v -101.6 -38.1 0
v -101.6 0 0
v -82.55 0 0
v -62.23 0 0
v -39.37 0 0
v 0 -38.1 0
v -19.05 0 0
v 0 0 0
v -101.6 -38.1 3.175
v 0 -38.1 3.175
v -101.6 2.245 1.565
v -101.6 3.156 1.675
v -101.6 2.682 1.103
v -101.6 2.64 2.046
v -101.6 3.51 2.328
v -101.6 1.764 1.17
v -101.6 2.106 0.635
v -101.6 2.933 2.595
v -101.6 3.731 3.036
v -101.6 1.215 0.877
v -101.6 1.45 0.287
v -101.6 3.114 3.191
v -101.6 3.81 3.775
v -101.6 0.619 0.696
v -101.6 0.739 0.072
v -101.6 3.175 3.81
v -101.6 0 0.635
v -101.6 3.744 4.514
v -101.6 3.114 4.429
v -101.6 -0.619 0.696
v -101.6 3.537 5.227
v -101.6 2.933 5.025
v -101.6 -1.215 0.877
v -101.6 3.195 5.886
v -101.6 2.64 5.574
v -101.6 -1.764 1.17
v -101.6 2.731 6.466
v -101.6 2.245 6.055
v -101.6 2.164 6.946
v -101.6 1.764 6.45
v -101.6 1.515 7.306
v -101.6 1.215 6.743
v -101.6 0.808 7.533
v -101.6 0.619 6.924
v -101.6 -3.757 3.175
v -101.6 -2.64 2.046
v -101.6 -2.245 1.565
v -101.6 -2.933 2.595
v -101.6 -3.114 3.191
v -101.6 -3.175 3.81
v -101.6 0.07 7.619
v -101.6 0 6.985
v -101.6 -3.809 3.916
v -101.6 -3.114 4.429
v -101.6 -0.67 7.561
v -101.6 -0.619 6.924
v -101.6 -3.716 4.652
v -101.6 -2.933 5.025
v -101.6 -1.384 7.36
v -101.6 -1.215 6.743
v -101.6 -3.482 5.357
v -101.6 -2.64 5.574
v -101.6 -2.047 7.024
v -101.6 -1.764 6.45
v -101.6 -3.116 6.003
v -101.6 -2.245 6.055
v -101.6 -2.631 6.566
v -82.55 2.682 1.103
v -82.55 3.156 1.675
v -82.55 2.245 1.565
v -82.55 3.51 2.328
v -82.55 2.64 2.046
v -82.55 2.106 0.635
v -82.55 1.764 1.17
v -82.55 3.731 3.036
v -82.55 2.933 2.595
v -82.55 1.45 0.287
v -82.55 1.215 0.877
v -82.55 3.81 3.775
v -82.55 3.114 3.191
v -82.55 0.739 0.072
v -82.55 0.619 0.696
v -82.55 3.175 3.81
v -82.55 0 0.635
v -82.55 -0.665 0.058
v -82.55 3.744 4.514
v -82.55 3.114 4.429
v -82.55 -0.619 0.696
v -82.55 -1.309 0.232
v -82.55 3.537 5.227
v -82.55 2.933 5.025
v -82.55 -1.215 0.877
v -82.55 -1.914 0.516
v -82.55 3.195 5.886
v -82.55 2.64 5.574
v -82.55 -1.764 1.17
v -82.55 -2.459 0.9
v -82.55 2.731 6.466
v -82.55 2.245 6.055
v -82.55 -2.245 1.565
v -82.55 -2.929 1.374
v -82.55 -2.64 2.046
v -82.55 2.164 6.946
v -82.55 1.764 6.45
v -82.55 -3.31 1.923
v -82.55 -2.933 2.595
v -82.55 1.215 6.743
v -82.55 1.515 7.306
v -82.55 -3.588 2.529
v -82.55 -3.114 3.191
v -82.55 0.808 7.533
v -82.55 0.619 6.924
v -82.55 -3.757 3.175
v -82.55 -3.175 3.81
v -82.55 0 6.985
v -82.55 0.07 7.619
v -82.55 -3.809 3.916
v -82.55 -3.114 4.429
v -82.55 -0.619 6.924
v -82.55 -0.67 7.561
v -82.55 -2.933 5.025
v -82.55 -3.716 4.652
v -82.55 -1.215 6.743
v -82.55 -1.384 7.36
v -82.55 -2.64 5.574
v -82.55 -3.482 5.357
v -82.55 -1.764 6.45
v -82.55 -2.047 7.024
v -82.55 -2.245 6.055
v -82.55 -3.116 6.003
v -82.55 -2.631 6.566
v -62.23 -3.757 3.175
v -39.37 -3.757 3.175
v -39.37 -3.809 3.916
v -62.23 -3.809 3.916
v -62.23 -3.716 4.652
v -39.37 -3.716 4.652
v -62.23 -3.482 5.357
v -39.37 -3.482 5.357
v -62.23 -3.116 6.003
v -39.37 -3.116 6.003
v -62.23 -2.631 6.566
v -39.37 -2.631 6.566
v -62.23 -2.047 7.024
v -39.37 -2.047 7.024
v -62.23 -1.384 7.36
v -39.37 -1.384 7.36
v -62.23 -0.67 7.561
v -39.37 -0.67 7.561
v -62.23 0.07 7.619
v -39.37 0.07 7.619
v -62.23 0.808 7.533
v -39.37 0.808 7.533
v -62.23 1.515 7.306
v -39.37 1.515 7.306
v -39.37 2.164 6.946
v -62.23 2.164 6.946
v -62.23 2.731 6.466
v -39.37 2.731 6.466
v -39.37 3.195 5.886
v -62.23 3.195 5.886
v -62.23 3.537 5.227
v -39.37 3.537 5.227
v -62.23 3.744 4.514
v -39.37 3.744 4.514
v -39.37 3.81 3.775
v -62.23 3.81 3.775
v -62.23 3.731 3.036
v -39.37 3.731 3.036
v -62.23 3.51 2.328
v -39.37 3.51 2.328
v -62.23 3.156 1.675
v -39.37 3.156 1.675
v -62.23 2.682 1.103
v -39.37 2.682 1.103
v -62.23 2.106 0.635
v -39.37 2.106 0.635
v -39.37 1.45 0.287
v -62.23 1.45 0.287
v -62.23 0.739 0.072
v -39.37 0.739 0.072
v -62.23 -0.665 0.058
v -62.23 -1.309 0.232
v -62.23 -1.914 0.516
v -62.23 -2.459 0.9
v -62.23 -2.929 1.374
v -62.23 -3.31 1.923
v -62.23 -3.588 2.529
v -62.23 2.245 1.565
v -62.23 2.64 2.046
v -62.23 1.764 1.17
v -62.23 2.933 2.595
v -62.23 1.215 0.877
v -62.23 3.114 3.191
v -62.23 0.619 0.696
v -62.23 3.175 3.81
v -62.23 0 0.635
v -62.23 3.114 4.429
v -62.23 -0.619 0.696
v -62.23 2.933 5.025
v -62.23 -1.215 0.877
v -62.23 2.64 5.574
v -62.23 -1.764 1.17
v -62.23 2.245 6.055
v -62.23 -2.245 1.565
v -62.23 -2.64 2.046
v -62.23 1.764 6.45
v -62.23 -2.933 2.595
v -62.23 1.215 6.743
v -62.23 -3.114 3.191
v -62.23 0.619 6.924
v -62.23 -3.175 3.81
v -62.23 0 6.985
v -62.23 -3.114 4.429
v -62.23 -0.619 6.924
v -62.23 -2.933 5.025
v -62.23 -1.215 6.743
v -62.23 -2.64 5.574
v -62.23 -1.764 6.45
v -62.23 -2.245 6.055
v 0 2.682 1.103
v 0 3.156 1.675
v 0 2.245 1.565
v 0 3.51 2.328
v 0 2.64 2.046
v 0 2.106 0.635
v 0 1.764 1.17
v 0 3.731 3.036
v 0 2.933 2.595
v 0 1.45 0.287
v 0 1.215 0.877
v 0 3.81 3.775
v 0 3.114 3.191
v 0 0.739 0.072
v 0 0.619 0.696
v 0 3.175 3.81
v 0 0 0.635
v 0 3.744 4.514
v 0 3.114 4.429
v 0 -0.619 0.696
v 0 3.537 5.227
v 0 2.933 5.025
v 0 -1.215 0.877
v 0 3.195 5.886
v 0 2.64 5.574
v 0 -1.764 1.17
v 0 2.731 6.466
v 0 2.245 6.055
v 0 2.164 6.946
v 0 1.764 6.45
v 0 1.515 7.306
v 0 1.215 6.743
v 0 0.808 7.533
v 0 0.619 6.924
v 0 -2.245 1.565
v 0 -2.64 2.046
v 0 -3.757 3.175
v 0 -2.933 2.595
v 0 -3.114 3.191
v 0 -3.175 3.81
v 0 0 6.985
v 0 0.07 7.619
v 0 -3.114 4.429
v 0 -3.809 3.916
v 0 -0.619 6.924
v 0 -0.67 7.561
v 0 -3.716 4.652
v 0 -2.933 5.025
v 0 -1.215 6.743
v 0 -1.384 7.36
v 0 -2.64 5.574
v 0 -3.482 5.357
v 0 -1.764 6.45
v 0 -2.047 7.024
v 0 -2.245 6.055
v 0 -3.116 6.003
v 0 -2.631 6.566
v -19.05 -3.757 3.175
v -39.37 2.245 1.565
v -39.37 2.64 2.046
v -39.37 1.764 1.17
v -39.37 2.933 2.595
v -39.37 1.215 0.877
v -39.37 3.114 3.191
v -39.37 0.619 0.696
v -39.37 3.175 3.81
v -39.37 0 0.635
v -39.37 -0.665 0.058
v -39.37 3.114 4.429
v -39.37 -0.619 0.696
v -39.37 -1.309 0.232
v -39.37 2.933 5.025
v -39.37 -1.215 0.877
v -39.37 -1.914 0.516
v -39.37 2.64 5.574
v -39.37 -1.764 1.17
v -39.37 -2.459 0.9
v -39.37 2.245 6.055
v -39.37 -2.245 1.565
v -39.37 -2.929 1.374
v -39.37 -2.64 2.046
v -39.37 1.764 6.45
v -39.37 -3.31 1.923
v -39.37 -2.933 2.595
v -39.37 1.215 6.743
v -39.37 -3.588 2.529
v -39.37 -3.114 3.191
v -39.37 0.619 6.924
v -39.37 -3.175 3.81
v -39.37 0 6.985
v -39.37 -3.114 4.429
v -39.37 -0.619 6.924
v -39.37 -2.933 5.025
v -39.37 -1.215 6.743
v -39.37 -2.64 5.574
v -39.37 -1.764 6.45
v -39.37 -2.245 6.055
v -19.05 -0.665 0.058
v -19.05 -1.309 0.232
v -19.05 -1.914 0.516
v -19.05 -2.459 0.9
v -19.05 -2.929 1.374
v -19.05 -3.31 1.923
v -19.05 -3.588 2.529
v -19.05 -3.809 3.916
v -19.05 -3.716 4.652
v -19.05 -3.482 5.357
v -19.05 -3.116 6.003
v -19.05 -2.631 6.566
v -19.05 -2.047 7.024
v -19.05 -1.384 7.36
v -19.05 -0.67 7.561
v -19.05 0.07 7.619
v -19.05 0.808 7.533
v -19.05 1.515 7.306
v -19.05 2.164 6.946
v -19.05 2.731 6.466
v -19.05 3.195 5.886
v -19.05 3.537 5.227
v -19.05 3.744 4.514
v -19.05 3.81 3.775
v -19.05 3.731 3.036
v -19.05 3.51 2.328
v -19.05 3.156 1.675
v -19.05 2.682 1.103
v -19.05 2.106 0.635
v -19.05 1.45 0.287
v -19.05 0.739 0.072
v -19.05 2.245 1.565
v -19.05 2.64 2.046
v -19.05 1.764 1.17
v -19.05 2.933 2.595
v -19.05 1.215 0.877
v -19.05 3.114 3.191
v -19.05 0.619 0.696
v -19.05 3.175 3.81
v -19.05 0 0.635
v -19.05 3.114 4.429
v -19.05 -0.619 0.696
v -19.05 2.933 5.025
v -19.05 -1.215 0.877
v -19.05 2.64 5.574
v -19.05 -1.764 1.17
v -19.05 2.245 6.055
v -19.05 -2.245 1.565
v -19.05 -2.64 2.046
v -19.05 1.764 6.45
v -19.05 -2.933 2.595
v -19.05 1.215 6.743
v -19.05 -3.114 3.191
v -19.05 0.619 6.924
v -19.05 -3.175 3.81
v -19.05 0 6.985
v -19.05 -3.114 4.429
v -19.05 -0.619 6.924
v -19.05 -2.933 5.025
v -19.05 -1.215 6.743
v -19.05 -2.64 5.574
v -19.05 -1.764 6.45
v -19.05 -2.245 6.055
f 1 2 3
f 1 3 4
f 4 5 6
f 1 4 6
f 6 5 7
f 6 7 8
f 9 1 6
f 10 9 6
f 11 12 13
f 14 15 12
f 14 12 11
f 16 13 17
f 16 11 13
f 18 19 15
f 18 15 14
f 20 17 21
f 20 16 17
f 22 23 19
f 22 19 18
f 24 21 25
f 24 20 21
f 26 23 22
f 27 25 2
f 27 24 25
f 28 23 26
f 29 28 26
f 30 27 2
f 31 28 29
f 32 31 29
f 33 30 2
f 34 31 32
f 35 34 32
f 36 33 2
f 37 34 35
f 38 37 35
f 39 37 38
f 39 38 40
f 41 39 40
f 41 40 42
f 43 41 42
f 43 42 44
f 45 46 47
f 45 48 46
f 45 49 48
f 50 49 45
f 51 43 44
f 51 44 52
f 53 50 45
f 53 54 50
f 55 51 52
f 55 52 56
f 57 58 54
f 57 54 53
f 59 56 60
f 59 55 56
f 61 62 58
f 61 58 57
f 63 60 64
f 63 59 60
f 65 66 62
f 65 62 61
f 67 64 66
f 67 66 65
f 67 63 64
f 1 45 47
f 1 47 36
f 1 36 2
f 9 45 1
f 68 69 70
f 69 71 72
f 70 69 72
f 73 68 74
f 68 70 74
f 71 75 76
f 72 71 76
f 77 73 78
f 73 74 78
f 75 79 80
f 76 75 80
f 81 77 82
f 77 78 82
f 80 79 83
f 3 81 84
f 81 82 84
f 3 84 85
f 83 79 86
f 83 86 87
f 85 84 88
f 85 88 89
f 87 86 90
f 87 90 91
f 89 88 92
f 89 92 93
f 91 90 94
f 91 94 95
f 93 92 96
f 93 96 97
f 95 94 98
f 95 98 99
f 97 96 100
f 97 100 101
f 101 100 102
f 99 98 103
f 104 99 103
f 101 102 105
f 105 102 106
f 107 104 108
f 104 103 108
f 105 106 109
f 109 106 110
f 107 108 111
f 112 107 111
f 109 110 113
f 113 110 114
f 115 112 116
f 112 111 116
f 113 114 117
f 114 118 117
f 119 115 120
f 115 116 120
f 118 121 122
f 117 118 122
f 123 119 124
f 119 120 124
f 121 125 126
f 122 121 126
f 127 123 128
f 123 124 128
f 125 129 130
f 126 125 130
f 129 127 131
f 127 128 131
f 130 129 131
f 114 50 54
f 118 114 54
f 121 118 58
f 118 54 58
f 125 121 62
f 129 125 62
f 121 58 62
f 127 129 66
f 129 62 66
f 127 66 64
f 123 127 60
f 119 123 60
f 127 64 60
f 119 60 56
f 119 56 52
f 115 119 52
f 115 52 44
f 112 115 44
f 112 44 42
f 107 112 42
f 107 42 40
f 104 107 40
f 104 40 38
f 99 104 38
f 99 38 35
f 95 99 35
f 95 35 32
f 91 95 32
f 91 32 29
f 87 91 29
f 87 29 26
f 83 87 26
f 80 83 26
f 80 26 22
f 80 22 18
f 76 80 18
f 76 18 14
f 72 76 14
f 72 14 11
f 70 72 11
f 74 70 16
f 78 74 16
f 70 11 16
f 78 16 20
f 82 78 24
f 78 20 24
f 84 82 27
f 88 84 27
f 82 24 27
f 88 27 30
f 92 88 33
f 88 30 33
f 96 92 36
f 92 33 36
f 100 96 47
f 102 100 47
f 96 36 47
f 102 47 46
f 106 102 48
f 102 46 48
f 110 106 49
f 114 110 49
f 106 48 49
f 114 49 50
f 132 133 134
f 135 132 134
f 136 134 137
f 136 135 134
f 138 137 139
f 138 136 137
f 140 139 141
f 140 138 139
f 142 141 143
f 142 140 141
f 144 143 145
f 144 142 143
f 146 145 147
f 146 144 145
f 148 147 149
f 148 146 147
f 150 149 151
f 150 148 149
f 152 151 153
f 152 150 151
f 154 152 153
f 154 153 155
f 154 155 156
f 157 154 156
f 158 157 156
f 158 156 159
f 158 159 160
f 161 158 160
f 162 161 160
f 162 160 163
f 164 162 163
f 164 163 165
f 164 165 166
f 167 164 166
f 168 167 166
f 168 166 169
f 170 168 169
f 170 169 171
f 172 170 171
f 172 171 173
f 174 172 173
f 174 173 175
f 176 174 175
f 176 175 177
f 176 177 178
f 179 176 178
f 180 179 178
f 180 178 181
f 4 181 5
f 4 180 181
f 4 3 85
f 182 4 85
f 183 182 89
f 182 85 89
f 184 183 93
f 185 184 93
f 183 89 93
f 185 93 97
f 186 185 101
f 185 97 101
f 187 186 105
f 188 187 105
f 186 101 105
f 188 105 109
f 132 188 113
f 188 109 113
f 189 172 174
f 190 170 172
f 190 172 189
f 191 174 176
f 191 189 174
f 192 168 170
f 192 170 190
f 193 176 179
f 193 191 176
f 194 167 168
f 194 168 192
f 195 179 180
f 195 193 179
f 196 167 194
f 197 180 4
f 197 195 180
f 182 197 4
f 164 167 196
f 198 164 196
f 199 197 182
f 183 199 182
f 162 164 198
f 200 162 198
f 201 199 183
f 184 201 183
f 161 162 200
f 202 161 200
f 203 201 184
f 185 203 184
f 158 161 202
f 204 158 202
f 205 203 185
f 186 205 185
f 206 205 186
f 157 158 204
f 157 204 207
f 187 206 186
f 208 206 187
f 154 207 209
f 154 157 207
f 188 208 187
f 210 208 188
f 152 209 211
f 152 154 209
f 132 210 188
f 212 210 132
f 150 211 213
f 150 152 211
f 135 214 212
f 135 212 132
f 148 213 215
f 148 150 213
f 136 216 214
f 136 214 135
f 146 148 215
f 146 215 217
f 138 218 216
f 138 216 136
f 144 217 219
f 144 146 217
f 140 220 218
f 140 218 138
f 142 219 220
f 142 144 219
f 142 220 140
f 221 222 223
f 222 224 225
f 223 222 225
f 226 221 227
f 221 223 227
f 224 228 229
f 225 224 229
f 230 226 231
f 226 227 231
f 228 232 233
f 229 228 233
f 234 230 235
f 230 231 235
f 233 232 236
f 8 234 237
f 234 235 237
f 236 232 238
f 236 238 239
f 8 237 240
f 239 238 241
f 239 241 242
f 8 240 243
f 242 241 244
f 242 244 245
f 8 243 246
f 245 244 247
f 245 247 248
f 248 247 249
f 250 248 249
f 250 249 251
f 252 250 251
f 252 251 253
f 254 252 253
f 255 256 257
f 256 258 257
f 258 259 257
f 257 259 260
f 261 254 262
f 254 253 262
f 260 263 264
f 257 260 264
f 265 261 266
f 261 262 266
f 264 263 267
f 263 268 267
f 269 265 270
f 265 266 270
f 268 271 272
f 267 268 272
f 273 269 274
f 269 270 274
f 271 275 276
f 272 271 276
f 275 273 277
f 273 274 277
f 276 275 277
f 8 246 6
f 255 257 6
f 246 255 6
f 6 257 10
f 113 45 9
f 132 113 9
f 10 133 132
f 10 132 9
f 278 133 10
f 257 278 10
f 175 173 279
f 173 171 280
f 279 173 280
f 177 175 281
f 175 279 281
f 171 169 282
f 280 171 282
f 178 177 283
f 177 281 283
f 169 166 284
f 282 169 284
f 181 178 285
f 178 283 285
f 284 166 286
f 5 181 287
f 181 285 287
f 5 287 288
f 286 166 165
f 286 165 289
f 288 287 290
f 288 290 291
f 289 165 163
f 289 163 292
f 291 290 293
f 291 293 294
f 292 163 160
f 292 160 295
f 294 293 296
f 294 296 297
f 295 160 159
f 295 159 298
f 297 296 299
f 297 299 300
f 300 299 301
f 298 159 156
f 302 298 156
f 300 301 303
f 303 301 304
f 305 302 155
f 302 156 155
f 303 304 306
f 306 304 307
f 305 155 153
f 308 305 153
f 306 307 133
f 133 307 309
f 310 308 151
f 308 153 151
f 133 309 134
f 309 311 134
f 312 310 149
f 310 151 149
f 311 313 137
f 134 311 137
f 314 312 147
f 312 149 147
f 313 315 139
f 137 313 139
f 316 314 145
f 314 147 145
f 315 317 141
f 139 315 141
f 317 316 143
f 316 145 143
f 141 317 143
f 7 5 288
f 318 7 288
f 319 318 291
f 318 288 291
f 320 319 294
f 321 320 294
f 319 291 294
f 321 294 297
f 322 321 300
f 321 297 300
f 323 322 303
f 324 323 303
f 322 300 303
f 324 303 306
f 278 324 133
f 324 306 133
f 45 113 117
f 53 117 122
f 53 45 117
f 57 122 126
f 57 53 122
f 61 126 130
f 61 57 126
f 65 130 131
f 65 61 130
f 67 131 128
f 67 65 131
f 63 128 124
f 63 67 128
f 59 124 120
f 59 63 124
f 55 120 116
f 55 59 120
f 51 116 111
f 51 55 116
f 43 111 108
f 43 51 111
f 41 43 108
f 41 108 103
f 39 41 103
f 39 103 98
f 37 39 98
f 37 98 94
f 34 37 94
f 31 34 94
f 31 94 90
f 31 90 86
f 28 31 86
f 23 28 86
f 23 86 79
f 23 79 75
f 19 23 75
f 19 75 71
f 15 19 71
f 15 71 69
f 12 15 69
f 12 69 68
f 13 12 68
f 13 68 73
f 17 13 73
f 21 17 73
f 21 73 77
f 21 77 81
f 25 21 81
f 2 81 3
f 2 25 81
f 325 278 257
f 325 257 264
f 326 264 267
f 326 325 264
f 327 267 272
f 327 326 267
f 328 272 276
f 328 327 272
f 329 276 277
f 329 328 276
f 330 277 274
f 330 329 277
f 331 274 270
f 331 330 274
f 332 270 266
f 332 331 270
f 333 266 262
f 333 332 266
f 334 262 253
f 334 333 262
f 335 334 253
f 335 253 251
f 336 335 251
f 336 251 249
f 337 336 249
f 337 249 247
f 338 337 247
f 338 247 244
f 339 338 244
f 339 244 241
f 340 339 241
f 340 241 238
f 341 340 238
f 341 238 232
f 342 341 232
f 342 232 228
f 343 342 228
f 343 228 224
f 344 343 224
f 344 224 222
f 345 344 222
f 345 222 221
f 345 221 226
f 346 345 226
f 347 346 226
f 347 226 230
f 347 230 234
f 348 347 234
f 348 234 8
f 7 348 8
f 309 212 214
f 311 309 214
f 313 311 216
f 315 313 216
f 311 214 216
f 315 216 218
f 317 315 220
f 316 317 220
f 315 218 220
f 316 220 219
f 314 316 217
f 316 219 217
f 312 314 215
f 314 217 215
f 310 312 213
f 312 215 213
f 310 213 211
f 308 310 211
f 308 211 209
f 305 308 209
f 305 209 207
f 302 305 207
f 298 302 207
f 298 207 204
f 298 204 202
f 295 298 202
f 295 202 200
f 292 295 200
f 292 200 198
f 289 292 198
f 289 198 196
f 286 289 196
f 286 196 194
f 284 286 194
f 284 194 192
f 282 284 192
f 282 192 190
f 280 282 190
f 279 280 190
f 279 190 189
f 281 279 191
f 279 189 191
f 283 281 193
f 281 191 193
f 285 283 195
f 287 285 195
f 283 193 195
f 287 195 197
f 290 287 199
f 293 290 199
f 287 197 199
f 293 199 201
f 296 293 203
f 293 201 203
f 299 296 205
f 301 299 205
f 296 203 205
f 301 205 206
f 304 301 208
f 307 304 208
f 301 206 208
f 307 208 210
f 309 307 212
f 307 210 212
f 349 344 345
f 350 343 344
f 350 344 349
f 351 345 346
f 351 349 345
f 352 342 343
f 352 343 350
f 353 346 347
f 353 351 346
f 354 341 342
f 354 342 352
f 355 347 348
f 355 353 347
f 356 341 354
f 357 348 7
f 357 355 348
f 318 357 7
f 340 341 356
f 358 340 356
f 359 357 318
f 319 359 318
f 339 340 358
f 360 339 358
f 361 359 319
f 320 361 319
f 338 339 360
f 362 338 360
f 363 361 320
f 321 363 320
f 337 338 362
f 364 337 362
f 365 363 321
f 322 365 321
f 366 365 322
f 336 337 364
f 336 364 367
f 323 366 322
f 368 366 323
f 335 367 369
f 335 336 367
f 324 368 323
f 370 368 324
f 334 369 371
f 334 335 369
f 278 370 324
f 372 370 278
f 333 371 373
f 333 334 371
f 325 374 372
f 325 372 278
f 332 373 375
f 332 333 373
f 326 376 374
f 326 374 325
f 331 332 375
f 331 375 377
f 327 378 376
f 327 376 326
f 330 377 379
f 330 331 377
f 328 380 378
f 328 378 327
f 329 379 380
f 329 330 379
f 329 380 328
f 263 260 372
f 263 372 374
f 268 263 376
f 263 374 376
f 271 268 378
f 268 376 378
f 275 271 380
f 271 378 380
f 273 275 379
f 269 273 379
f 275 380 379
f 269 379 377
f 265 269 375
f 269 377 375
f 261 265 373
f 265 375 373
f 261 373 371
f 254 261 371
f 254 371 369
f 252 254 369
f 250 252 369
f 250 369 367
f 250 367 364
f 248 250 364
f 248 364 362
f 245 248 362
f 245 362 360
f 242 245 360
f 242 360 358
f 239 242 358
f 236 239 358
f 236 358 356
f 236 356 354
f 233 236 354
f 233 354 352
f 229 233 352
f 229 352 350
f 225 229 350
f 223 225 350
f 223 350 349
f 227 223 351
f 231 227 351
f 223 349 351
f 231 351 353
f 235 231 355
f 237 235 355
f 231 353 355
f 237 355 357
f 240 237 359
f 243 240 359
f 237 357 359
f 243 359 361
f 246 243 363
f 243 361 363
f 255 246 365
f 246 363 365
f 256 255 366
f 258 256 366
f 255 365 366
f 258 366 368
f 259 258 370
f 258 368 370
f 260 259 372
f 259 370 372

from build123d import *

# Parameters (mm, degrees)
F0_W     = 101.6
F0_H     = 38.1
F1_DEPTH = 3.175
F3_DEPTH = 254
F2_R     = 3.81
F2_R_2   = 3.175
F4_DEPTH = 101.6
F5_START = -19.05
F5_DEPTH = 20.32
F6_START = -62.23
F6_DEPTH = 20.32


with BuildPart() as f1:
    # F0 (on Top) → F1 (new body)
    with BuildSketch(Plane.XY):
        with Locations((-50.8, -19.05)):
            Rectangle(F0_W, F0_H)
    extrude(amount=F1_DEPTH)

    # F2 (on face) → F3 (cut)
    with BuildSketch(Plane(origin=(-101.6, 0, 0), x_dir=(0, -1, 0), z_dir=(-1, 0, 0))):
        with BuildLine():
            ThreePointArc((3.7567106623, 3.175), (3.7966542918, 3.4913839483), (3.81, 3.81))
            ThreePointArc((3.81, 3.81), (-2.6940768363, 6.5040768363), (0, 0))
            Line((0, 0), (0, 0.635))
            ThreePointArc((0, 0.635), (-2.2450640303, 6.0550640303), (3.175, 3.81))
            ThreePointArc((3.175, 3.81), (3.1589222858, 3.4908840456), (3.1108519733, 3.175))
            Line((3.1108519733, 3.175), (3.7567106623, 3.175))
        make_face()
        with BuildLine():
            Line((0, 0.635), (0, 0))
            ThreePointArc((0, 0), (2.4593444248, 0.9000644337), (3.7567106623, 3.175))
            Line((3.7567106623, 3.175), (3.1108519733, 3.175))
            ThreePointArc((3.1108519733, 3.175), (2.0080463142, 1.3506555752), (0, 0.635))
        make_face()
        with BuildLine():
            Line((0, 3.175), (0, 0.635))
            ThreePointArc((0, 0.635), (2.0080463142, 1.3506555752), (3.1108519733, 3.175))
            Line((3.1108519733, 3.175), (0, 3.175))
        make_face()
    extrude(amount=-F3_DEPTH, mode=Mode.SUBTRACT)

    # F2 (on face) → F4 (join, through all)
    with BuildSketch(Plane(origin=(-101.6, 0, 0), x_dir=(0, -1, 0), z_dir=(-1, 0, 0))):
        with Locations((0, 3.81)):
            Circle(F2_R)
        with Locations((0, 3.81)):
            Circle(F2_R_2, mode=Mode.SUBTRACT)
    extrude(amount=-F4_DEPTH)

    # F2 (on face) → F5 (cut)
    with BuildSketch(Plane(origin=(-101.6, 0, 0), x_dir=(0, -1, 0), z_dir=(-1, 0, 0)).offset(F5_START)):
        with Locations((0, 3.81)):
            Circle(F2_R)
        with Locations((0, 3.81)):
            Circle(F2_R_2, mode=Mode.SUBTRACT)
    extrude(amount=-F5_DEPTH, mode=Mode.SUBTRACT)

    # F2 (on face) → F6 (cut)
    with BuildSketch(Plane(origin=(-101.6, 0, 0), x_dir=(0, -1, 0), z_dir=(-1, 0, 0)).offset(F6_START)):
        with Locations((0, 3.81)):
            Circle(F2_R)
        with Locations((0, 3.81)):
            Circle(F2_R_2, mode=Mode.SUBTRACT)
    extrude(amount=-F6_DEPTH, mode=Mode.SUBTRACT)


solid = f1.part
